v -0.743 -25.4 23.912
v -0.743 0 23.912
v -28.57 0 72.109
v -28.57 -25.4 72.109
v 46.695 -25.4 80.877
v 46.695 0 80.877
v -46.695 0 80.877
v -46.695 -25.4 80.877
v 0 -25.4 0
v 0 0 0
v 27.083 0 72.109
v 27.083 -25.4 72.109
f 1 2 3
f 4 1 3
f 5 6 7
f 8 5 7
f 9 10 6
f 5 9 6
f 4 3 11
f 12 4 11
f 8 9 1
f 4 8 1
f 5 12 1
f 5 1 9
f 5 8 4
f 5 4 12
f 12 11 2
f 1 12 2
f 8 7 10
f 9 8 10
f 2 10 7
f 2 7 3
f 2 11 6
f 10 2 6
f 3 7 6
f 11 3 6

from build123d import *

# Parameters (mm, degrees)
F1_DEPTH = 25.4


with BuildPart() as f1:
    # F0 (on Front) → F1 (new body)
    with BuildSketch(Plane.XZ):
        Polygon((-46.694561, 80.877353), (0, 0), (46.694561, 80.877353), align=None)
        Polygon((-0.743479, 23.911752), (-28.570018, 72.108731), (27.08306, 72.108731), align=None, mode=Mode.SUBTRACT)
    extrude(amount=F1_DEPTH)


solid = f1.part
